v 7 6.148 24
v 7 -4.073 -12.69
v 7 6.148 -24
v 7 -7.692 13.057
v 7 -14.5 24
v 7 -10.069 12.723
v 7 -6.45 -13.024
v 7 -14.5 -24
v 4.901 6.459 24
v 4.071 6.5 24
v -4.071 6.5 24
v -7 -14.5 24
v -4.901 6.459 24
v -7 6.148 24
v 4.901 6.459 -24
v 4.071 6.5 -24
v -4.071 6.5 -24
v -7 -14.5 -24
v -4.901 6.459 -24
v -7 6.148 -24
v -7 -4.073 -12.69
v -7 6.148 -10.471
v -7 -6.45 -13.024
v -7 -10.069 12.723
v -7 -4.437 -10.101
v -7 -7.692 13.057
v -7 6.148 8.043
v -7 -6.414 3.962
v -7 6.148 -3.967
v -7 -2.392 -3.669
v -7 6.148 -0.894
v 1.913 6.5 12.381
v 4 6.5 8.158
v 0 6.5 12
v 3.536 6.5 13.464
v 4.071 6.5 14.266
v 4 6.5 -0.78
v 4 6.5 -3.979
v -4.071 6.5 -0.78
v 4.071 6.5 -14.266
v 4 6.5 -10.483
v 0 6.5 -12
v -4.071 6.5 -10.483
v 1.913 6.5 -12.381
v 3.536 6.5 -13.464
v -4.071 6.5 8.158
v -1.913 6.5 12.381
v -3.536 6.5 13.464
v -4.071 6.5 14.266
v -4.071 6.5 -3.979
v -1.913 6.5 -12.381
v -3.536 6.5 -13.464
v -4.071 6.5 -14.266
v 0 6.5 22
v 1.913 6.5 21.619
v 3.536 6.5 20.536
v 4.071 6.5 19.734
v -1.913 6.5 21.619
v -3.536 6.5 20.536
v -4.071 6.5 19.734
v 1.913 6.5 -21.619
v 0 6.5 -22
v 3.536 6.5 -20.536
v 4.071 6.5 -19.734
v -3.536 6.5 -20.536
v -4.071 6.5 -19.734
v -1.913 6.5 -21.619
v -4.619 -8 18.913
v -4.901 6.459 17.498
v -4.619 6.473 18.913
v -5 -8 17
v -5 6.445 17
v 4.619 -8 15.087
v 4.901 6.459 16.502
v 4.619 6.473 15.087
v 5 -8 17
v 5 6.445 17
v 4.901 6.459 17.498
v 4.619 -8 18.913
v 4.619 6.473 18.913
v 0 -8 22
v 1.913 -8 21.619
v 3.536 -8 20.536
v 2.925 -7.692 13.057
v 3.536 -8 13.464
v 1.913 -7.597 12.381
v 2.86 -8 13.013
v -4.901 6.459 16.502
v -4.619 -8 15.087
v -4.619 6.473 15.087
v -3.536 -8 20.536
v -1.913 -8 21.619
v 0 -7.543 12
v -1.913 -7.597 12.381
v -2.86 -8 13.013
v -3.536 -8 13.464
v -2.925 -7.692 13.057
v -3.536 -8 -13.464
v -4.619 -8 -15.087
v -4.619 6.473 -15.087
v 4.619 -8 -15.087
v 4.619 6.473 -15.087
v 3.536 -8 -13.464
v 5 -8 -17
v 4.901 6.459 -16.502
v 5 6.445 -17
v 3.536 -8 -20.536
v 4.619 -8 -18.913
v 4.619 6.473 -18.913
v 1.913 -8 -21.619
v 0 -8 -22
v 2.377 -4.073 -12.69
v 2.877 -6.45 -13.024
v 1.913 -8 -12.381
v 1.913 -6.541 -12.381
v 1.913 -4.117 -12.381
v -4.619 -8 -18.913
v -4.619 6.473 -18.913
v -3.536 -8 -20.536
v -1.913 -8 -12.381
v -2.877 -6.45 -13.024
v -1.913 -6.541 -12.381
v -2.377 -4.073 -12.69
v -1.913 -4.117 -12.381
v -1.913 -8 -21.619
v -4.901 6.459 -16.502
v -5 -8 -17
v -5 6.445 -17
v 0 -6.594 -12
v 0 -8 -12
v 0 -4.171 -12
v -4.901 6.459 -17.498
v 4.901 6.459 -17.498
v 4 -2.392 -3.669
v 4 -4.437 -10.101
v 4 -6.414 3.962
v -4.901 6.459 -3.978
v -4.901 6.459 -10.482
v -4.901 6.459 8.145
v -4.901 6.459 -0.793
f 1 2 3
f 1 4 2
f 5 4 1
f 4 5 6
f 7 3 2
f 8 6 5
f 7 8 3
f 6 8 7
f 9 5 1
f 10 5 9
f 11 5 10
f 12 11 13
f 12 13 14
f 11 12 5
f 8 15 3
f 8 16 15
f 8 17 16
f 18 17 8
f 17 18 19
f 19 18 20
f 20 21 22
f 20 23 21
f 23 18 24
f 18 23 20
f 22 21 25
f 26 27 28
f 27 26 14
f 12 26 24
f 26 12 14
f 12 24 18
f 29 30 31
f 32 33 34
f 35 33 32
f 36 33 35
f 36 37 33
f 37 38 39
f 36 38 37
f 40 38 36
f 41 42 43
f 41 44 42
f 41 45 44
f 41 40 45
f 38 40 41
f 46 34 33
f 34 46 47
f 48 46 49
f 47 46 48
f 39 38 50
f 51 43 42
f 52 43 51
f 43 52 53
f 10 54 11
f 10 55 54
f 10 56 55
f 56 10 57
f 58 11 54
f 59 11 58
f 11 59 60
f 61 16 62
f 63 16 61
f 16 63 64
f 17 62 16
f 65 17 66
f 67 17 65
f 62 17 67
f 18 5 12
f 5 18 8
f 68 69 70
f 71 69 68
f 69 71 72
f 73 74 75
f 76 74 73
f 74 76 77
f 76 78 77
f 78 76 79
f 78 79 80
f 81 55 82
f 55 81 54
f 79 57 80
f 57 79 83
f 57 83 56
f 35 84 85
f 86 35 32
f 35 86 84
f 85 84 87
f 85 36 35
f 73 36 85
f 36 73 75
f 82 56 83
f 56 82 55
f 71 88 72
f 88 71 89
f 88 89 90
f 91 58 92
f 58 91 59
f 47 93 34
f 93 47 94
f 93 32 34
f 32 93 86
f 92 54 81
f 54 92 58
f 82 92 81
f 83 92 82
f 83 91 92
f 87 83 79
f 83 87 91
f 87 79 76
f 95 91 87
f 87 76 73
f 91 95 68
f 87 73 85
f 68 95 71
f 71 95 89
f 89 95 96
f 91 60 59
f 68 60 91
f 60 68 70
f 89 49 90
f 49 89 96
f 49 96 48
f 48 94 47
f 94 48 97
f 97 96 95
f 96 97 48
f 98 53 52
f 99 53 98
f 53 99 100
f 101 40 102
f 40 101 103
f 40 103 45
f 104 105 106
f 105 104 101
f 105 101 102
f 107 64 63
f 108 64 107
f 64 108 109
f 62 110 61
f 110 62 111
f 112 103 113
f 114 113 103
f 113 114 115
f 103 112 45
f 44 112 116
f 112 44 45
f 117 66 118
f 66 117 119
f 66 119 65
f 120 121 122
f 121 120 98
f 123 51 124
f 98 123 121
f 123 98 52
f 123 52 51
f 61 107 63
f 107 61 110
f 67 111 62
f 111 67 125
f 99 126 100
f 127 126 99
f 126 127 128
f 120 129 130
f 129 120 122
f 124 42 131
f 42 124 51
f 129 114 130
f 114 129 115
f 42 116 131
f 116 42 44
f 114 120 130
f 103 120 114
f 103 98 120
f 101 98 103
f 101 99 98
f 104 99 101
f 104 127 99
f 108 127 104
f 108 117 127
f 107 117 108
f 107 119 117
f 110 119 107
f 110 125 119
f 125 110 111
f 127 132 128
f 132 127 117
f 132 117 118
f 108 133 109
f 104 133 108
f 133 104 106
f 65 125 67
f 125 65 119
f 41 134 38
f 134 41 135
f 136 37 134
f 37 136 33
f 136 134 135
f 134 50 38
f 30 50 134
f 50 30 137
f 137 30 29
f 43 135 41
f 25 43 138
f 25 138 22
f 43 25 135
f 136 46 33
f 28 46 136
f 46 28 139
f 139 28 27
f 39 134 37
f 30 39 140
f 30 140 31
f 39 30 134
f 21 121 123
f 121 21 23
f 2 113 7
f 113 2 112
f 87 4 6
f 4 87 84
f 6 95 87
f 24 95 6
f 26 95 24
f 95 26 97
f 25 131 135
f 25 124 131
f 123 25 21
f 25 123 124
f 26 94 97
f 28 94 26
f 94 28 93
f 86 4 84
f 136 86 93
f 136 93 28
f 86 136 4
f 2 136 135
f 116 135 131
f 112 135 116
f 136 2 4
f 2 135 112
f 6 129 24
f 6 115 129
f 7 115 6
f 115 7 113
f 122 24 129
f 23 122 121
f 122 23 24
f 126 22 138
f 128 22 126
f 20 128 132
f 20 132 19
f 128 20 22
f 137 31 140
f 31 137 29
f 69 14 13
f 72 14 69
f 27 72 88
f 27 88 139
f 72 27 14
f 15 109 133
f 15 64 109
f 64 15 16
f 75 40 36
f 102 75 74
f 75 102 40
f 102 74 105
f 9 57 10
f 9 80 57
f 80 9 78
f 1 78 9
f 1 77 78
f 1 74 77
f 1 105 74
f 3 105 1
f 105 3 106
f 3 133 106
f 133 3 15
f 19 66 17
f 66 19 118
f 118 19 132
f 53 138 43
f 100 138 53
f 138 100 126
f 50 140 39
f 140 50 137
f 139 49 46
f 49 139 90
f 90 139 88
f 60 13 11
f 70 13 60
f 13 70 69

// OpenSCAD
diameter=10;
height=4;
number=3;
distance=5;
baseline=30; 


module maghole(diameter,height,number,back) {
		translate([0,height*(number-2)/2,0])
        rotate([90,0,0])
         cylinder(r=diameter/2,h=height*(2*number-1),center=true);
    if(back == 1) {
		translate([0,-height*2*(number+1)/2,0])
        rotate([90,0,0])
         cylinder(r=diameter/2,h=height*number,center=true);
    }
}

module smaghole(diameter,height,number,back) {
		translate([0,.15+height*(number-2)/2,0])
        rotate([90,0,0])
         cylinder(r=0.3+diameter/2,h=height*(2*number-1),center=true);
    if(back == 1) {
		translate([0,-(0.15+height*2*(number+1)/2),0])
        rotate([90,0,0])
         cylinder(r=0.3+diameter/2,h=height*number,center=true);
    }
}
module mirror(diameter,height,number,distance,baseline) {
width=diameter+4;
depth=distance+height*number+4;
length=baseline+diameter+8;
mirrorthick = 1.8;
   difference() {
     translate([0,-height,0])
	   cube([width,  // Small dimension
            depth, // Optical path dim
		      length],center=true);
      translate([0,0,2+baseline/2])
             maghole(diameter,height,number,0);
     translate([0,0,-(2+baseline/2)])
             maghole(diameter,height,number,0);

     rotate([-2,0,0])
     translate([-4,0.5+depth/4,-7])
          cube([width+2,depth+2,((length-2*width)/2)-3.5],center=true);

     rotate([18,0,0])
     translate([-4,depth/4,1.5])
          cube([width+2,depth+2,((length-2*width)/2)-1.5],center=true);

    rotate([8,0,0])
     translate([0,-depth/3,1])
          cube([width+2,mirrorthick+0.6,length-(2*diameter+2)],center=true);
     }
}

module sensor(diameter,height,number,distance,baseline) {
width=diameter+4;
depth=distance+height*number+4;
length=baseline+diameter+8;
mirrorthick = 2.6;
extra=2*width+4;

   difference() {
     translate([2+width/2,-height,0])
	   cube([extra,  // Small dimension
            depth, // Optical path dim
		      length],center=true);
      translate([0,0,2+baseline/2])
             smaghole(diameter,height,number,1);
     translate([0,0,-(2+baseline/2)])
             smaghole(diameter,height,number,1);
//LASER
     translate([0,0,4])
        rotate([90,0,0])
             cylinder(r=3.2,h=40,center=true,$fn=24);
//PhotoTransistor
     translate([0,0,-2])
        rotate([90,0,0])
             cylinder(r=2,h=40,center=true,$fn=12);
// TEMP SENSOR
     translate([2+width,0,0])
        rotate([90,0,0])
             cylinder(r=4.7,h=40,center=true);

     }

     difference() {
     translate([0,-4,-2.5])cube([5,6,5],center=true);
     translate([0,-8,0])
        cylinder(r=3.2,h=10,center=true,$fn=12);
     translate([0,0,-1.2])
        rotate([90,0,0])
             cylinder(r=0.6,h=40,center=true,$fn=6);
     translate([0,0,-2.8])
        rotate([90,0,0])
             cylinder(r=0.6,h=40,center=true,$fn=6);
     }
}

module jarwall() {
  difference() {
     cube([40,40,120],center=true);
	  translate([40,0,0])
	     cylinder(r=50,h=120,center=true,$fn=64);
	   }
}

module jar() {
	  translate([-8,110,-10])
	          cylinder(r=50,h=120,center=true,$fn=64);
}

module powerhole(dim) {
offset = dim+2;
  //  cylinder(r=dim,h=2*dim,center=true,$fn=10);
  //  translate([dim-1.6,0,0])
   //   cylinder(r=dim,h=dim,center=true,$fn=10);
    translate([dim-3,0,0]) cube([2*dim+2,2*dim-1,2*dim-1],center=true);
    translate([-offset,0,0])
      cylinder(r=1.1,h=2*dim,center=true,$fn=10);
    translate([offset+2,0,0])
      cylinder(r=1.1,h=2*dim,center=true,$fn=10);
}

module sensordevice() {
  wall = 32;
  side = 44;
  deep = 50;
  difference() { 
   sensor(diameter,height,number,distance,baseline);
   translate([6,-60,3]) jar();
  }
  translate([-7,-(wall+30),21]) cube([wall,side+12,3]);

     translate([-7,-(wall+30),-24])
         cube([wall,side+12,3]);

  difference() {
  translate([23.5,-(wall+7),0])
    rotate([0,90,0])
    cube([side,deep,3],center=true);
     translate([24,-54,12])
			rotate([0,90,0]) 
           powerhole(4.5);
  }
}
module mirrordevice() {
  difference() { 
   mirror(diameter,height,number,distance,baseline);
   translate([0,-3.3,0]) rotate([0,0,-90]) jarwall();
  }
}

//rotate([0,90,180]) 
  // sensordevice();
   mirrordevice();



     
